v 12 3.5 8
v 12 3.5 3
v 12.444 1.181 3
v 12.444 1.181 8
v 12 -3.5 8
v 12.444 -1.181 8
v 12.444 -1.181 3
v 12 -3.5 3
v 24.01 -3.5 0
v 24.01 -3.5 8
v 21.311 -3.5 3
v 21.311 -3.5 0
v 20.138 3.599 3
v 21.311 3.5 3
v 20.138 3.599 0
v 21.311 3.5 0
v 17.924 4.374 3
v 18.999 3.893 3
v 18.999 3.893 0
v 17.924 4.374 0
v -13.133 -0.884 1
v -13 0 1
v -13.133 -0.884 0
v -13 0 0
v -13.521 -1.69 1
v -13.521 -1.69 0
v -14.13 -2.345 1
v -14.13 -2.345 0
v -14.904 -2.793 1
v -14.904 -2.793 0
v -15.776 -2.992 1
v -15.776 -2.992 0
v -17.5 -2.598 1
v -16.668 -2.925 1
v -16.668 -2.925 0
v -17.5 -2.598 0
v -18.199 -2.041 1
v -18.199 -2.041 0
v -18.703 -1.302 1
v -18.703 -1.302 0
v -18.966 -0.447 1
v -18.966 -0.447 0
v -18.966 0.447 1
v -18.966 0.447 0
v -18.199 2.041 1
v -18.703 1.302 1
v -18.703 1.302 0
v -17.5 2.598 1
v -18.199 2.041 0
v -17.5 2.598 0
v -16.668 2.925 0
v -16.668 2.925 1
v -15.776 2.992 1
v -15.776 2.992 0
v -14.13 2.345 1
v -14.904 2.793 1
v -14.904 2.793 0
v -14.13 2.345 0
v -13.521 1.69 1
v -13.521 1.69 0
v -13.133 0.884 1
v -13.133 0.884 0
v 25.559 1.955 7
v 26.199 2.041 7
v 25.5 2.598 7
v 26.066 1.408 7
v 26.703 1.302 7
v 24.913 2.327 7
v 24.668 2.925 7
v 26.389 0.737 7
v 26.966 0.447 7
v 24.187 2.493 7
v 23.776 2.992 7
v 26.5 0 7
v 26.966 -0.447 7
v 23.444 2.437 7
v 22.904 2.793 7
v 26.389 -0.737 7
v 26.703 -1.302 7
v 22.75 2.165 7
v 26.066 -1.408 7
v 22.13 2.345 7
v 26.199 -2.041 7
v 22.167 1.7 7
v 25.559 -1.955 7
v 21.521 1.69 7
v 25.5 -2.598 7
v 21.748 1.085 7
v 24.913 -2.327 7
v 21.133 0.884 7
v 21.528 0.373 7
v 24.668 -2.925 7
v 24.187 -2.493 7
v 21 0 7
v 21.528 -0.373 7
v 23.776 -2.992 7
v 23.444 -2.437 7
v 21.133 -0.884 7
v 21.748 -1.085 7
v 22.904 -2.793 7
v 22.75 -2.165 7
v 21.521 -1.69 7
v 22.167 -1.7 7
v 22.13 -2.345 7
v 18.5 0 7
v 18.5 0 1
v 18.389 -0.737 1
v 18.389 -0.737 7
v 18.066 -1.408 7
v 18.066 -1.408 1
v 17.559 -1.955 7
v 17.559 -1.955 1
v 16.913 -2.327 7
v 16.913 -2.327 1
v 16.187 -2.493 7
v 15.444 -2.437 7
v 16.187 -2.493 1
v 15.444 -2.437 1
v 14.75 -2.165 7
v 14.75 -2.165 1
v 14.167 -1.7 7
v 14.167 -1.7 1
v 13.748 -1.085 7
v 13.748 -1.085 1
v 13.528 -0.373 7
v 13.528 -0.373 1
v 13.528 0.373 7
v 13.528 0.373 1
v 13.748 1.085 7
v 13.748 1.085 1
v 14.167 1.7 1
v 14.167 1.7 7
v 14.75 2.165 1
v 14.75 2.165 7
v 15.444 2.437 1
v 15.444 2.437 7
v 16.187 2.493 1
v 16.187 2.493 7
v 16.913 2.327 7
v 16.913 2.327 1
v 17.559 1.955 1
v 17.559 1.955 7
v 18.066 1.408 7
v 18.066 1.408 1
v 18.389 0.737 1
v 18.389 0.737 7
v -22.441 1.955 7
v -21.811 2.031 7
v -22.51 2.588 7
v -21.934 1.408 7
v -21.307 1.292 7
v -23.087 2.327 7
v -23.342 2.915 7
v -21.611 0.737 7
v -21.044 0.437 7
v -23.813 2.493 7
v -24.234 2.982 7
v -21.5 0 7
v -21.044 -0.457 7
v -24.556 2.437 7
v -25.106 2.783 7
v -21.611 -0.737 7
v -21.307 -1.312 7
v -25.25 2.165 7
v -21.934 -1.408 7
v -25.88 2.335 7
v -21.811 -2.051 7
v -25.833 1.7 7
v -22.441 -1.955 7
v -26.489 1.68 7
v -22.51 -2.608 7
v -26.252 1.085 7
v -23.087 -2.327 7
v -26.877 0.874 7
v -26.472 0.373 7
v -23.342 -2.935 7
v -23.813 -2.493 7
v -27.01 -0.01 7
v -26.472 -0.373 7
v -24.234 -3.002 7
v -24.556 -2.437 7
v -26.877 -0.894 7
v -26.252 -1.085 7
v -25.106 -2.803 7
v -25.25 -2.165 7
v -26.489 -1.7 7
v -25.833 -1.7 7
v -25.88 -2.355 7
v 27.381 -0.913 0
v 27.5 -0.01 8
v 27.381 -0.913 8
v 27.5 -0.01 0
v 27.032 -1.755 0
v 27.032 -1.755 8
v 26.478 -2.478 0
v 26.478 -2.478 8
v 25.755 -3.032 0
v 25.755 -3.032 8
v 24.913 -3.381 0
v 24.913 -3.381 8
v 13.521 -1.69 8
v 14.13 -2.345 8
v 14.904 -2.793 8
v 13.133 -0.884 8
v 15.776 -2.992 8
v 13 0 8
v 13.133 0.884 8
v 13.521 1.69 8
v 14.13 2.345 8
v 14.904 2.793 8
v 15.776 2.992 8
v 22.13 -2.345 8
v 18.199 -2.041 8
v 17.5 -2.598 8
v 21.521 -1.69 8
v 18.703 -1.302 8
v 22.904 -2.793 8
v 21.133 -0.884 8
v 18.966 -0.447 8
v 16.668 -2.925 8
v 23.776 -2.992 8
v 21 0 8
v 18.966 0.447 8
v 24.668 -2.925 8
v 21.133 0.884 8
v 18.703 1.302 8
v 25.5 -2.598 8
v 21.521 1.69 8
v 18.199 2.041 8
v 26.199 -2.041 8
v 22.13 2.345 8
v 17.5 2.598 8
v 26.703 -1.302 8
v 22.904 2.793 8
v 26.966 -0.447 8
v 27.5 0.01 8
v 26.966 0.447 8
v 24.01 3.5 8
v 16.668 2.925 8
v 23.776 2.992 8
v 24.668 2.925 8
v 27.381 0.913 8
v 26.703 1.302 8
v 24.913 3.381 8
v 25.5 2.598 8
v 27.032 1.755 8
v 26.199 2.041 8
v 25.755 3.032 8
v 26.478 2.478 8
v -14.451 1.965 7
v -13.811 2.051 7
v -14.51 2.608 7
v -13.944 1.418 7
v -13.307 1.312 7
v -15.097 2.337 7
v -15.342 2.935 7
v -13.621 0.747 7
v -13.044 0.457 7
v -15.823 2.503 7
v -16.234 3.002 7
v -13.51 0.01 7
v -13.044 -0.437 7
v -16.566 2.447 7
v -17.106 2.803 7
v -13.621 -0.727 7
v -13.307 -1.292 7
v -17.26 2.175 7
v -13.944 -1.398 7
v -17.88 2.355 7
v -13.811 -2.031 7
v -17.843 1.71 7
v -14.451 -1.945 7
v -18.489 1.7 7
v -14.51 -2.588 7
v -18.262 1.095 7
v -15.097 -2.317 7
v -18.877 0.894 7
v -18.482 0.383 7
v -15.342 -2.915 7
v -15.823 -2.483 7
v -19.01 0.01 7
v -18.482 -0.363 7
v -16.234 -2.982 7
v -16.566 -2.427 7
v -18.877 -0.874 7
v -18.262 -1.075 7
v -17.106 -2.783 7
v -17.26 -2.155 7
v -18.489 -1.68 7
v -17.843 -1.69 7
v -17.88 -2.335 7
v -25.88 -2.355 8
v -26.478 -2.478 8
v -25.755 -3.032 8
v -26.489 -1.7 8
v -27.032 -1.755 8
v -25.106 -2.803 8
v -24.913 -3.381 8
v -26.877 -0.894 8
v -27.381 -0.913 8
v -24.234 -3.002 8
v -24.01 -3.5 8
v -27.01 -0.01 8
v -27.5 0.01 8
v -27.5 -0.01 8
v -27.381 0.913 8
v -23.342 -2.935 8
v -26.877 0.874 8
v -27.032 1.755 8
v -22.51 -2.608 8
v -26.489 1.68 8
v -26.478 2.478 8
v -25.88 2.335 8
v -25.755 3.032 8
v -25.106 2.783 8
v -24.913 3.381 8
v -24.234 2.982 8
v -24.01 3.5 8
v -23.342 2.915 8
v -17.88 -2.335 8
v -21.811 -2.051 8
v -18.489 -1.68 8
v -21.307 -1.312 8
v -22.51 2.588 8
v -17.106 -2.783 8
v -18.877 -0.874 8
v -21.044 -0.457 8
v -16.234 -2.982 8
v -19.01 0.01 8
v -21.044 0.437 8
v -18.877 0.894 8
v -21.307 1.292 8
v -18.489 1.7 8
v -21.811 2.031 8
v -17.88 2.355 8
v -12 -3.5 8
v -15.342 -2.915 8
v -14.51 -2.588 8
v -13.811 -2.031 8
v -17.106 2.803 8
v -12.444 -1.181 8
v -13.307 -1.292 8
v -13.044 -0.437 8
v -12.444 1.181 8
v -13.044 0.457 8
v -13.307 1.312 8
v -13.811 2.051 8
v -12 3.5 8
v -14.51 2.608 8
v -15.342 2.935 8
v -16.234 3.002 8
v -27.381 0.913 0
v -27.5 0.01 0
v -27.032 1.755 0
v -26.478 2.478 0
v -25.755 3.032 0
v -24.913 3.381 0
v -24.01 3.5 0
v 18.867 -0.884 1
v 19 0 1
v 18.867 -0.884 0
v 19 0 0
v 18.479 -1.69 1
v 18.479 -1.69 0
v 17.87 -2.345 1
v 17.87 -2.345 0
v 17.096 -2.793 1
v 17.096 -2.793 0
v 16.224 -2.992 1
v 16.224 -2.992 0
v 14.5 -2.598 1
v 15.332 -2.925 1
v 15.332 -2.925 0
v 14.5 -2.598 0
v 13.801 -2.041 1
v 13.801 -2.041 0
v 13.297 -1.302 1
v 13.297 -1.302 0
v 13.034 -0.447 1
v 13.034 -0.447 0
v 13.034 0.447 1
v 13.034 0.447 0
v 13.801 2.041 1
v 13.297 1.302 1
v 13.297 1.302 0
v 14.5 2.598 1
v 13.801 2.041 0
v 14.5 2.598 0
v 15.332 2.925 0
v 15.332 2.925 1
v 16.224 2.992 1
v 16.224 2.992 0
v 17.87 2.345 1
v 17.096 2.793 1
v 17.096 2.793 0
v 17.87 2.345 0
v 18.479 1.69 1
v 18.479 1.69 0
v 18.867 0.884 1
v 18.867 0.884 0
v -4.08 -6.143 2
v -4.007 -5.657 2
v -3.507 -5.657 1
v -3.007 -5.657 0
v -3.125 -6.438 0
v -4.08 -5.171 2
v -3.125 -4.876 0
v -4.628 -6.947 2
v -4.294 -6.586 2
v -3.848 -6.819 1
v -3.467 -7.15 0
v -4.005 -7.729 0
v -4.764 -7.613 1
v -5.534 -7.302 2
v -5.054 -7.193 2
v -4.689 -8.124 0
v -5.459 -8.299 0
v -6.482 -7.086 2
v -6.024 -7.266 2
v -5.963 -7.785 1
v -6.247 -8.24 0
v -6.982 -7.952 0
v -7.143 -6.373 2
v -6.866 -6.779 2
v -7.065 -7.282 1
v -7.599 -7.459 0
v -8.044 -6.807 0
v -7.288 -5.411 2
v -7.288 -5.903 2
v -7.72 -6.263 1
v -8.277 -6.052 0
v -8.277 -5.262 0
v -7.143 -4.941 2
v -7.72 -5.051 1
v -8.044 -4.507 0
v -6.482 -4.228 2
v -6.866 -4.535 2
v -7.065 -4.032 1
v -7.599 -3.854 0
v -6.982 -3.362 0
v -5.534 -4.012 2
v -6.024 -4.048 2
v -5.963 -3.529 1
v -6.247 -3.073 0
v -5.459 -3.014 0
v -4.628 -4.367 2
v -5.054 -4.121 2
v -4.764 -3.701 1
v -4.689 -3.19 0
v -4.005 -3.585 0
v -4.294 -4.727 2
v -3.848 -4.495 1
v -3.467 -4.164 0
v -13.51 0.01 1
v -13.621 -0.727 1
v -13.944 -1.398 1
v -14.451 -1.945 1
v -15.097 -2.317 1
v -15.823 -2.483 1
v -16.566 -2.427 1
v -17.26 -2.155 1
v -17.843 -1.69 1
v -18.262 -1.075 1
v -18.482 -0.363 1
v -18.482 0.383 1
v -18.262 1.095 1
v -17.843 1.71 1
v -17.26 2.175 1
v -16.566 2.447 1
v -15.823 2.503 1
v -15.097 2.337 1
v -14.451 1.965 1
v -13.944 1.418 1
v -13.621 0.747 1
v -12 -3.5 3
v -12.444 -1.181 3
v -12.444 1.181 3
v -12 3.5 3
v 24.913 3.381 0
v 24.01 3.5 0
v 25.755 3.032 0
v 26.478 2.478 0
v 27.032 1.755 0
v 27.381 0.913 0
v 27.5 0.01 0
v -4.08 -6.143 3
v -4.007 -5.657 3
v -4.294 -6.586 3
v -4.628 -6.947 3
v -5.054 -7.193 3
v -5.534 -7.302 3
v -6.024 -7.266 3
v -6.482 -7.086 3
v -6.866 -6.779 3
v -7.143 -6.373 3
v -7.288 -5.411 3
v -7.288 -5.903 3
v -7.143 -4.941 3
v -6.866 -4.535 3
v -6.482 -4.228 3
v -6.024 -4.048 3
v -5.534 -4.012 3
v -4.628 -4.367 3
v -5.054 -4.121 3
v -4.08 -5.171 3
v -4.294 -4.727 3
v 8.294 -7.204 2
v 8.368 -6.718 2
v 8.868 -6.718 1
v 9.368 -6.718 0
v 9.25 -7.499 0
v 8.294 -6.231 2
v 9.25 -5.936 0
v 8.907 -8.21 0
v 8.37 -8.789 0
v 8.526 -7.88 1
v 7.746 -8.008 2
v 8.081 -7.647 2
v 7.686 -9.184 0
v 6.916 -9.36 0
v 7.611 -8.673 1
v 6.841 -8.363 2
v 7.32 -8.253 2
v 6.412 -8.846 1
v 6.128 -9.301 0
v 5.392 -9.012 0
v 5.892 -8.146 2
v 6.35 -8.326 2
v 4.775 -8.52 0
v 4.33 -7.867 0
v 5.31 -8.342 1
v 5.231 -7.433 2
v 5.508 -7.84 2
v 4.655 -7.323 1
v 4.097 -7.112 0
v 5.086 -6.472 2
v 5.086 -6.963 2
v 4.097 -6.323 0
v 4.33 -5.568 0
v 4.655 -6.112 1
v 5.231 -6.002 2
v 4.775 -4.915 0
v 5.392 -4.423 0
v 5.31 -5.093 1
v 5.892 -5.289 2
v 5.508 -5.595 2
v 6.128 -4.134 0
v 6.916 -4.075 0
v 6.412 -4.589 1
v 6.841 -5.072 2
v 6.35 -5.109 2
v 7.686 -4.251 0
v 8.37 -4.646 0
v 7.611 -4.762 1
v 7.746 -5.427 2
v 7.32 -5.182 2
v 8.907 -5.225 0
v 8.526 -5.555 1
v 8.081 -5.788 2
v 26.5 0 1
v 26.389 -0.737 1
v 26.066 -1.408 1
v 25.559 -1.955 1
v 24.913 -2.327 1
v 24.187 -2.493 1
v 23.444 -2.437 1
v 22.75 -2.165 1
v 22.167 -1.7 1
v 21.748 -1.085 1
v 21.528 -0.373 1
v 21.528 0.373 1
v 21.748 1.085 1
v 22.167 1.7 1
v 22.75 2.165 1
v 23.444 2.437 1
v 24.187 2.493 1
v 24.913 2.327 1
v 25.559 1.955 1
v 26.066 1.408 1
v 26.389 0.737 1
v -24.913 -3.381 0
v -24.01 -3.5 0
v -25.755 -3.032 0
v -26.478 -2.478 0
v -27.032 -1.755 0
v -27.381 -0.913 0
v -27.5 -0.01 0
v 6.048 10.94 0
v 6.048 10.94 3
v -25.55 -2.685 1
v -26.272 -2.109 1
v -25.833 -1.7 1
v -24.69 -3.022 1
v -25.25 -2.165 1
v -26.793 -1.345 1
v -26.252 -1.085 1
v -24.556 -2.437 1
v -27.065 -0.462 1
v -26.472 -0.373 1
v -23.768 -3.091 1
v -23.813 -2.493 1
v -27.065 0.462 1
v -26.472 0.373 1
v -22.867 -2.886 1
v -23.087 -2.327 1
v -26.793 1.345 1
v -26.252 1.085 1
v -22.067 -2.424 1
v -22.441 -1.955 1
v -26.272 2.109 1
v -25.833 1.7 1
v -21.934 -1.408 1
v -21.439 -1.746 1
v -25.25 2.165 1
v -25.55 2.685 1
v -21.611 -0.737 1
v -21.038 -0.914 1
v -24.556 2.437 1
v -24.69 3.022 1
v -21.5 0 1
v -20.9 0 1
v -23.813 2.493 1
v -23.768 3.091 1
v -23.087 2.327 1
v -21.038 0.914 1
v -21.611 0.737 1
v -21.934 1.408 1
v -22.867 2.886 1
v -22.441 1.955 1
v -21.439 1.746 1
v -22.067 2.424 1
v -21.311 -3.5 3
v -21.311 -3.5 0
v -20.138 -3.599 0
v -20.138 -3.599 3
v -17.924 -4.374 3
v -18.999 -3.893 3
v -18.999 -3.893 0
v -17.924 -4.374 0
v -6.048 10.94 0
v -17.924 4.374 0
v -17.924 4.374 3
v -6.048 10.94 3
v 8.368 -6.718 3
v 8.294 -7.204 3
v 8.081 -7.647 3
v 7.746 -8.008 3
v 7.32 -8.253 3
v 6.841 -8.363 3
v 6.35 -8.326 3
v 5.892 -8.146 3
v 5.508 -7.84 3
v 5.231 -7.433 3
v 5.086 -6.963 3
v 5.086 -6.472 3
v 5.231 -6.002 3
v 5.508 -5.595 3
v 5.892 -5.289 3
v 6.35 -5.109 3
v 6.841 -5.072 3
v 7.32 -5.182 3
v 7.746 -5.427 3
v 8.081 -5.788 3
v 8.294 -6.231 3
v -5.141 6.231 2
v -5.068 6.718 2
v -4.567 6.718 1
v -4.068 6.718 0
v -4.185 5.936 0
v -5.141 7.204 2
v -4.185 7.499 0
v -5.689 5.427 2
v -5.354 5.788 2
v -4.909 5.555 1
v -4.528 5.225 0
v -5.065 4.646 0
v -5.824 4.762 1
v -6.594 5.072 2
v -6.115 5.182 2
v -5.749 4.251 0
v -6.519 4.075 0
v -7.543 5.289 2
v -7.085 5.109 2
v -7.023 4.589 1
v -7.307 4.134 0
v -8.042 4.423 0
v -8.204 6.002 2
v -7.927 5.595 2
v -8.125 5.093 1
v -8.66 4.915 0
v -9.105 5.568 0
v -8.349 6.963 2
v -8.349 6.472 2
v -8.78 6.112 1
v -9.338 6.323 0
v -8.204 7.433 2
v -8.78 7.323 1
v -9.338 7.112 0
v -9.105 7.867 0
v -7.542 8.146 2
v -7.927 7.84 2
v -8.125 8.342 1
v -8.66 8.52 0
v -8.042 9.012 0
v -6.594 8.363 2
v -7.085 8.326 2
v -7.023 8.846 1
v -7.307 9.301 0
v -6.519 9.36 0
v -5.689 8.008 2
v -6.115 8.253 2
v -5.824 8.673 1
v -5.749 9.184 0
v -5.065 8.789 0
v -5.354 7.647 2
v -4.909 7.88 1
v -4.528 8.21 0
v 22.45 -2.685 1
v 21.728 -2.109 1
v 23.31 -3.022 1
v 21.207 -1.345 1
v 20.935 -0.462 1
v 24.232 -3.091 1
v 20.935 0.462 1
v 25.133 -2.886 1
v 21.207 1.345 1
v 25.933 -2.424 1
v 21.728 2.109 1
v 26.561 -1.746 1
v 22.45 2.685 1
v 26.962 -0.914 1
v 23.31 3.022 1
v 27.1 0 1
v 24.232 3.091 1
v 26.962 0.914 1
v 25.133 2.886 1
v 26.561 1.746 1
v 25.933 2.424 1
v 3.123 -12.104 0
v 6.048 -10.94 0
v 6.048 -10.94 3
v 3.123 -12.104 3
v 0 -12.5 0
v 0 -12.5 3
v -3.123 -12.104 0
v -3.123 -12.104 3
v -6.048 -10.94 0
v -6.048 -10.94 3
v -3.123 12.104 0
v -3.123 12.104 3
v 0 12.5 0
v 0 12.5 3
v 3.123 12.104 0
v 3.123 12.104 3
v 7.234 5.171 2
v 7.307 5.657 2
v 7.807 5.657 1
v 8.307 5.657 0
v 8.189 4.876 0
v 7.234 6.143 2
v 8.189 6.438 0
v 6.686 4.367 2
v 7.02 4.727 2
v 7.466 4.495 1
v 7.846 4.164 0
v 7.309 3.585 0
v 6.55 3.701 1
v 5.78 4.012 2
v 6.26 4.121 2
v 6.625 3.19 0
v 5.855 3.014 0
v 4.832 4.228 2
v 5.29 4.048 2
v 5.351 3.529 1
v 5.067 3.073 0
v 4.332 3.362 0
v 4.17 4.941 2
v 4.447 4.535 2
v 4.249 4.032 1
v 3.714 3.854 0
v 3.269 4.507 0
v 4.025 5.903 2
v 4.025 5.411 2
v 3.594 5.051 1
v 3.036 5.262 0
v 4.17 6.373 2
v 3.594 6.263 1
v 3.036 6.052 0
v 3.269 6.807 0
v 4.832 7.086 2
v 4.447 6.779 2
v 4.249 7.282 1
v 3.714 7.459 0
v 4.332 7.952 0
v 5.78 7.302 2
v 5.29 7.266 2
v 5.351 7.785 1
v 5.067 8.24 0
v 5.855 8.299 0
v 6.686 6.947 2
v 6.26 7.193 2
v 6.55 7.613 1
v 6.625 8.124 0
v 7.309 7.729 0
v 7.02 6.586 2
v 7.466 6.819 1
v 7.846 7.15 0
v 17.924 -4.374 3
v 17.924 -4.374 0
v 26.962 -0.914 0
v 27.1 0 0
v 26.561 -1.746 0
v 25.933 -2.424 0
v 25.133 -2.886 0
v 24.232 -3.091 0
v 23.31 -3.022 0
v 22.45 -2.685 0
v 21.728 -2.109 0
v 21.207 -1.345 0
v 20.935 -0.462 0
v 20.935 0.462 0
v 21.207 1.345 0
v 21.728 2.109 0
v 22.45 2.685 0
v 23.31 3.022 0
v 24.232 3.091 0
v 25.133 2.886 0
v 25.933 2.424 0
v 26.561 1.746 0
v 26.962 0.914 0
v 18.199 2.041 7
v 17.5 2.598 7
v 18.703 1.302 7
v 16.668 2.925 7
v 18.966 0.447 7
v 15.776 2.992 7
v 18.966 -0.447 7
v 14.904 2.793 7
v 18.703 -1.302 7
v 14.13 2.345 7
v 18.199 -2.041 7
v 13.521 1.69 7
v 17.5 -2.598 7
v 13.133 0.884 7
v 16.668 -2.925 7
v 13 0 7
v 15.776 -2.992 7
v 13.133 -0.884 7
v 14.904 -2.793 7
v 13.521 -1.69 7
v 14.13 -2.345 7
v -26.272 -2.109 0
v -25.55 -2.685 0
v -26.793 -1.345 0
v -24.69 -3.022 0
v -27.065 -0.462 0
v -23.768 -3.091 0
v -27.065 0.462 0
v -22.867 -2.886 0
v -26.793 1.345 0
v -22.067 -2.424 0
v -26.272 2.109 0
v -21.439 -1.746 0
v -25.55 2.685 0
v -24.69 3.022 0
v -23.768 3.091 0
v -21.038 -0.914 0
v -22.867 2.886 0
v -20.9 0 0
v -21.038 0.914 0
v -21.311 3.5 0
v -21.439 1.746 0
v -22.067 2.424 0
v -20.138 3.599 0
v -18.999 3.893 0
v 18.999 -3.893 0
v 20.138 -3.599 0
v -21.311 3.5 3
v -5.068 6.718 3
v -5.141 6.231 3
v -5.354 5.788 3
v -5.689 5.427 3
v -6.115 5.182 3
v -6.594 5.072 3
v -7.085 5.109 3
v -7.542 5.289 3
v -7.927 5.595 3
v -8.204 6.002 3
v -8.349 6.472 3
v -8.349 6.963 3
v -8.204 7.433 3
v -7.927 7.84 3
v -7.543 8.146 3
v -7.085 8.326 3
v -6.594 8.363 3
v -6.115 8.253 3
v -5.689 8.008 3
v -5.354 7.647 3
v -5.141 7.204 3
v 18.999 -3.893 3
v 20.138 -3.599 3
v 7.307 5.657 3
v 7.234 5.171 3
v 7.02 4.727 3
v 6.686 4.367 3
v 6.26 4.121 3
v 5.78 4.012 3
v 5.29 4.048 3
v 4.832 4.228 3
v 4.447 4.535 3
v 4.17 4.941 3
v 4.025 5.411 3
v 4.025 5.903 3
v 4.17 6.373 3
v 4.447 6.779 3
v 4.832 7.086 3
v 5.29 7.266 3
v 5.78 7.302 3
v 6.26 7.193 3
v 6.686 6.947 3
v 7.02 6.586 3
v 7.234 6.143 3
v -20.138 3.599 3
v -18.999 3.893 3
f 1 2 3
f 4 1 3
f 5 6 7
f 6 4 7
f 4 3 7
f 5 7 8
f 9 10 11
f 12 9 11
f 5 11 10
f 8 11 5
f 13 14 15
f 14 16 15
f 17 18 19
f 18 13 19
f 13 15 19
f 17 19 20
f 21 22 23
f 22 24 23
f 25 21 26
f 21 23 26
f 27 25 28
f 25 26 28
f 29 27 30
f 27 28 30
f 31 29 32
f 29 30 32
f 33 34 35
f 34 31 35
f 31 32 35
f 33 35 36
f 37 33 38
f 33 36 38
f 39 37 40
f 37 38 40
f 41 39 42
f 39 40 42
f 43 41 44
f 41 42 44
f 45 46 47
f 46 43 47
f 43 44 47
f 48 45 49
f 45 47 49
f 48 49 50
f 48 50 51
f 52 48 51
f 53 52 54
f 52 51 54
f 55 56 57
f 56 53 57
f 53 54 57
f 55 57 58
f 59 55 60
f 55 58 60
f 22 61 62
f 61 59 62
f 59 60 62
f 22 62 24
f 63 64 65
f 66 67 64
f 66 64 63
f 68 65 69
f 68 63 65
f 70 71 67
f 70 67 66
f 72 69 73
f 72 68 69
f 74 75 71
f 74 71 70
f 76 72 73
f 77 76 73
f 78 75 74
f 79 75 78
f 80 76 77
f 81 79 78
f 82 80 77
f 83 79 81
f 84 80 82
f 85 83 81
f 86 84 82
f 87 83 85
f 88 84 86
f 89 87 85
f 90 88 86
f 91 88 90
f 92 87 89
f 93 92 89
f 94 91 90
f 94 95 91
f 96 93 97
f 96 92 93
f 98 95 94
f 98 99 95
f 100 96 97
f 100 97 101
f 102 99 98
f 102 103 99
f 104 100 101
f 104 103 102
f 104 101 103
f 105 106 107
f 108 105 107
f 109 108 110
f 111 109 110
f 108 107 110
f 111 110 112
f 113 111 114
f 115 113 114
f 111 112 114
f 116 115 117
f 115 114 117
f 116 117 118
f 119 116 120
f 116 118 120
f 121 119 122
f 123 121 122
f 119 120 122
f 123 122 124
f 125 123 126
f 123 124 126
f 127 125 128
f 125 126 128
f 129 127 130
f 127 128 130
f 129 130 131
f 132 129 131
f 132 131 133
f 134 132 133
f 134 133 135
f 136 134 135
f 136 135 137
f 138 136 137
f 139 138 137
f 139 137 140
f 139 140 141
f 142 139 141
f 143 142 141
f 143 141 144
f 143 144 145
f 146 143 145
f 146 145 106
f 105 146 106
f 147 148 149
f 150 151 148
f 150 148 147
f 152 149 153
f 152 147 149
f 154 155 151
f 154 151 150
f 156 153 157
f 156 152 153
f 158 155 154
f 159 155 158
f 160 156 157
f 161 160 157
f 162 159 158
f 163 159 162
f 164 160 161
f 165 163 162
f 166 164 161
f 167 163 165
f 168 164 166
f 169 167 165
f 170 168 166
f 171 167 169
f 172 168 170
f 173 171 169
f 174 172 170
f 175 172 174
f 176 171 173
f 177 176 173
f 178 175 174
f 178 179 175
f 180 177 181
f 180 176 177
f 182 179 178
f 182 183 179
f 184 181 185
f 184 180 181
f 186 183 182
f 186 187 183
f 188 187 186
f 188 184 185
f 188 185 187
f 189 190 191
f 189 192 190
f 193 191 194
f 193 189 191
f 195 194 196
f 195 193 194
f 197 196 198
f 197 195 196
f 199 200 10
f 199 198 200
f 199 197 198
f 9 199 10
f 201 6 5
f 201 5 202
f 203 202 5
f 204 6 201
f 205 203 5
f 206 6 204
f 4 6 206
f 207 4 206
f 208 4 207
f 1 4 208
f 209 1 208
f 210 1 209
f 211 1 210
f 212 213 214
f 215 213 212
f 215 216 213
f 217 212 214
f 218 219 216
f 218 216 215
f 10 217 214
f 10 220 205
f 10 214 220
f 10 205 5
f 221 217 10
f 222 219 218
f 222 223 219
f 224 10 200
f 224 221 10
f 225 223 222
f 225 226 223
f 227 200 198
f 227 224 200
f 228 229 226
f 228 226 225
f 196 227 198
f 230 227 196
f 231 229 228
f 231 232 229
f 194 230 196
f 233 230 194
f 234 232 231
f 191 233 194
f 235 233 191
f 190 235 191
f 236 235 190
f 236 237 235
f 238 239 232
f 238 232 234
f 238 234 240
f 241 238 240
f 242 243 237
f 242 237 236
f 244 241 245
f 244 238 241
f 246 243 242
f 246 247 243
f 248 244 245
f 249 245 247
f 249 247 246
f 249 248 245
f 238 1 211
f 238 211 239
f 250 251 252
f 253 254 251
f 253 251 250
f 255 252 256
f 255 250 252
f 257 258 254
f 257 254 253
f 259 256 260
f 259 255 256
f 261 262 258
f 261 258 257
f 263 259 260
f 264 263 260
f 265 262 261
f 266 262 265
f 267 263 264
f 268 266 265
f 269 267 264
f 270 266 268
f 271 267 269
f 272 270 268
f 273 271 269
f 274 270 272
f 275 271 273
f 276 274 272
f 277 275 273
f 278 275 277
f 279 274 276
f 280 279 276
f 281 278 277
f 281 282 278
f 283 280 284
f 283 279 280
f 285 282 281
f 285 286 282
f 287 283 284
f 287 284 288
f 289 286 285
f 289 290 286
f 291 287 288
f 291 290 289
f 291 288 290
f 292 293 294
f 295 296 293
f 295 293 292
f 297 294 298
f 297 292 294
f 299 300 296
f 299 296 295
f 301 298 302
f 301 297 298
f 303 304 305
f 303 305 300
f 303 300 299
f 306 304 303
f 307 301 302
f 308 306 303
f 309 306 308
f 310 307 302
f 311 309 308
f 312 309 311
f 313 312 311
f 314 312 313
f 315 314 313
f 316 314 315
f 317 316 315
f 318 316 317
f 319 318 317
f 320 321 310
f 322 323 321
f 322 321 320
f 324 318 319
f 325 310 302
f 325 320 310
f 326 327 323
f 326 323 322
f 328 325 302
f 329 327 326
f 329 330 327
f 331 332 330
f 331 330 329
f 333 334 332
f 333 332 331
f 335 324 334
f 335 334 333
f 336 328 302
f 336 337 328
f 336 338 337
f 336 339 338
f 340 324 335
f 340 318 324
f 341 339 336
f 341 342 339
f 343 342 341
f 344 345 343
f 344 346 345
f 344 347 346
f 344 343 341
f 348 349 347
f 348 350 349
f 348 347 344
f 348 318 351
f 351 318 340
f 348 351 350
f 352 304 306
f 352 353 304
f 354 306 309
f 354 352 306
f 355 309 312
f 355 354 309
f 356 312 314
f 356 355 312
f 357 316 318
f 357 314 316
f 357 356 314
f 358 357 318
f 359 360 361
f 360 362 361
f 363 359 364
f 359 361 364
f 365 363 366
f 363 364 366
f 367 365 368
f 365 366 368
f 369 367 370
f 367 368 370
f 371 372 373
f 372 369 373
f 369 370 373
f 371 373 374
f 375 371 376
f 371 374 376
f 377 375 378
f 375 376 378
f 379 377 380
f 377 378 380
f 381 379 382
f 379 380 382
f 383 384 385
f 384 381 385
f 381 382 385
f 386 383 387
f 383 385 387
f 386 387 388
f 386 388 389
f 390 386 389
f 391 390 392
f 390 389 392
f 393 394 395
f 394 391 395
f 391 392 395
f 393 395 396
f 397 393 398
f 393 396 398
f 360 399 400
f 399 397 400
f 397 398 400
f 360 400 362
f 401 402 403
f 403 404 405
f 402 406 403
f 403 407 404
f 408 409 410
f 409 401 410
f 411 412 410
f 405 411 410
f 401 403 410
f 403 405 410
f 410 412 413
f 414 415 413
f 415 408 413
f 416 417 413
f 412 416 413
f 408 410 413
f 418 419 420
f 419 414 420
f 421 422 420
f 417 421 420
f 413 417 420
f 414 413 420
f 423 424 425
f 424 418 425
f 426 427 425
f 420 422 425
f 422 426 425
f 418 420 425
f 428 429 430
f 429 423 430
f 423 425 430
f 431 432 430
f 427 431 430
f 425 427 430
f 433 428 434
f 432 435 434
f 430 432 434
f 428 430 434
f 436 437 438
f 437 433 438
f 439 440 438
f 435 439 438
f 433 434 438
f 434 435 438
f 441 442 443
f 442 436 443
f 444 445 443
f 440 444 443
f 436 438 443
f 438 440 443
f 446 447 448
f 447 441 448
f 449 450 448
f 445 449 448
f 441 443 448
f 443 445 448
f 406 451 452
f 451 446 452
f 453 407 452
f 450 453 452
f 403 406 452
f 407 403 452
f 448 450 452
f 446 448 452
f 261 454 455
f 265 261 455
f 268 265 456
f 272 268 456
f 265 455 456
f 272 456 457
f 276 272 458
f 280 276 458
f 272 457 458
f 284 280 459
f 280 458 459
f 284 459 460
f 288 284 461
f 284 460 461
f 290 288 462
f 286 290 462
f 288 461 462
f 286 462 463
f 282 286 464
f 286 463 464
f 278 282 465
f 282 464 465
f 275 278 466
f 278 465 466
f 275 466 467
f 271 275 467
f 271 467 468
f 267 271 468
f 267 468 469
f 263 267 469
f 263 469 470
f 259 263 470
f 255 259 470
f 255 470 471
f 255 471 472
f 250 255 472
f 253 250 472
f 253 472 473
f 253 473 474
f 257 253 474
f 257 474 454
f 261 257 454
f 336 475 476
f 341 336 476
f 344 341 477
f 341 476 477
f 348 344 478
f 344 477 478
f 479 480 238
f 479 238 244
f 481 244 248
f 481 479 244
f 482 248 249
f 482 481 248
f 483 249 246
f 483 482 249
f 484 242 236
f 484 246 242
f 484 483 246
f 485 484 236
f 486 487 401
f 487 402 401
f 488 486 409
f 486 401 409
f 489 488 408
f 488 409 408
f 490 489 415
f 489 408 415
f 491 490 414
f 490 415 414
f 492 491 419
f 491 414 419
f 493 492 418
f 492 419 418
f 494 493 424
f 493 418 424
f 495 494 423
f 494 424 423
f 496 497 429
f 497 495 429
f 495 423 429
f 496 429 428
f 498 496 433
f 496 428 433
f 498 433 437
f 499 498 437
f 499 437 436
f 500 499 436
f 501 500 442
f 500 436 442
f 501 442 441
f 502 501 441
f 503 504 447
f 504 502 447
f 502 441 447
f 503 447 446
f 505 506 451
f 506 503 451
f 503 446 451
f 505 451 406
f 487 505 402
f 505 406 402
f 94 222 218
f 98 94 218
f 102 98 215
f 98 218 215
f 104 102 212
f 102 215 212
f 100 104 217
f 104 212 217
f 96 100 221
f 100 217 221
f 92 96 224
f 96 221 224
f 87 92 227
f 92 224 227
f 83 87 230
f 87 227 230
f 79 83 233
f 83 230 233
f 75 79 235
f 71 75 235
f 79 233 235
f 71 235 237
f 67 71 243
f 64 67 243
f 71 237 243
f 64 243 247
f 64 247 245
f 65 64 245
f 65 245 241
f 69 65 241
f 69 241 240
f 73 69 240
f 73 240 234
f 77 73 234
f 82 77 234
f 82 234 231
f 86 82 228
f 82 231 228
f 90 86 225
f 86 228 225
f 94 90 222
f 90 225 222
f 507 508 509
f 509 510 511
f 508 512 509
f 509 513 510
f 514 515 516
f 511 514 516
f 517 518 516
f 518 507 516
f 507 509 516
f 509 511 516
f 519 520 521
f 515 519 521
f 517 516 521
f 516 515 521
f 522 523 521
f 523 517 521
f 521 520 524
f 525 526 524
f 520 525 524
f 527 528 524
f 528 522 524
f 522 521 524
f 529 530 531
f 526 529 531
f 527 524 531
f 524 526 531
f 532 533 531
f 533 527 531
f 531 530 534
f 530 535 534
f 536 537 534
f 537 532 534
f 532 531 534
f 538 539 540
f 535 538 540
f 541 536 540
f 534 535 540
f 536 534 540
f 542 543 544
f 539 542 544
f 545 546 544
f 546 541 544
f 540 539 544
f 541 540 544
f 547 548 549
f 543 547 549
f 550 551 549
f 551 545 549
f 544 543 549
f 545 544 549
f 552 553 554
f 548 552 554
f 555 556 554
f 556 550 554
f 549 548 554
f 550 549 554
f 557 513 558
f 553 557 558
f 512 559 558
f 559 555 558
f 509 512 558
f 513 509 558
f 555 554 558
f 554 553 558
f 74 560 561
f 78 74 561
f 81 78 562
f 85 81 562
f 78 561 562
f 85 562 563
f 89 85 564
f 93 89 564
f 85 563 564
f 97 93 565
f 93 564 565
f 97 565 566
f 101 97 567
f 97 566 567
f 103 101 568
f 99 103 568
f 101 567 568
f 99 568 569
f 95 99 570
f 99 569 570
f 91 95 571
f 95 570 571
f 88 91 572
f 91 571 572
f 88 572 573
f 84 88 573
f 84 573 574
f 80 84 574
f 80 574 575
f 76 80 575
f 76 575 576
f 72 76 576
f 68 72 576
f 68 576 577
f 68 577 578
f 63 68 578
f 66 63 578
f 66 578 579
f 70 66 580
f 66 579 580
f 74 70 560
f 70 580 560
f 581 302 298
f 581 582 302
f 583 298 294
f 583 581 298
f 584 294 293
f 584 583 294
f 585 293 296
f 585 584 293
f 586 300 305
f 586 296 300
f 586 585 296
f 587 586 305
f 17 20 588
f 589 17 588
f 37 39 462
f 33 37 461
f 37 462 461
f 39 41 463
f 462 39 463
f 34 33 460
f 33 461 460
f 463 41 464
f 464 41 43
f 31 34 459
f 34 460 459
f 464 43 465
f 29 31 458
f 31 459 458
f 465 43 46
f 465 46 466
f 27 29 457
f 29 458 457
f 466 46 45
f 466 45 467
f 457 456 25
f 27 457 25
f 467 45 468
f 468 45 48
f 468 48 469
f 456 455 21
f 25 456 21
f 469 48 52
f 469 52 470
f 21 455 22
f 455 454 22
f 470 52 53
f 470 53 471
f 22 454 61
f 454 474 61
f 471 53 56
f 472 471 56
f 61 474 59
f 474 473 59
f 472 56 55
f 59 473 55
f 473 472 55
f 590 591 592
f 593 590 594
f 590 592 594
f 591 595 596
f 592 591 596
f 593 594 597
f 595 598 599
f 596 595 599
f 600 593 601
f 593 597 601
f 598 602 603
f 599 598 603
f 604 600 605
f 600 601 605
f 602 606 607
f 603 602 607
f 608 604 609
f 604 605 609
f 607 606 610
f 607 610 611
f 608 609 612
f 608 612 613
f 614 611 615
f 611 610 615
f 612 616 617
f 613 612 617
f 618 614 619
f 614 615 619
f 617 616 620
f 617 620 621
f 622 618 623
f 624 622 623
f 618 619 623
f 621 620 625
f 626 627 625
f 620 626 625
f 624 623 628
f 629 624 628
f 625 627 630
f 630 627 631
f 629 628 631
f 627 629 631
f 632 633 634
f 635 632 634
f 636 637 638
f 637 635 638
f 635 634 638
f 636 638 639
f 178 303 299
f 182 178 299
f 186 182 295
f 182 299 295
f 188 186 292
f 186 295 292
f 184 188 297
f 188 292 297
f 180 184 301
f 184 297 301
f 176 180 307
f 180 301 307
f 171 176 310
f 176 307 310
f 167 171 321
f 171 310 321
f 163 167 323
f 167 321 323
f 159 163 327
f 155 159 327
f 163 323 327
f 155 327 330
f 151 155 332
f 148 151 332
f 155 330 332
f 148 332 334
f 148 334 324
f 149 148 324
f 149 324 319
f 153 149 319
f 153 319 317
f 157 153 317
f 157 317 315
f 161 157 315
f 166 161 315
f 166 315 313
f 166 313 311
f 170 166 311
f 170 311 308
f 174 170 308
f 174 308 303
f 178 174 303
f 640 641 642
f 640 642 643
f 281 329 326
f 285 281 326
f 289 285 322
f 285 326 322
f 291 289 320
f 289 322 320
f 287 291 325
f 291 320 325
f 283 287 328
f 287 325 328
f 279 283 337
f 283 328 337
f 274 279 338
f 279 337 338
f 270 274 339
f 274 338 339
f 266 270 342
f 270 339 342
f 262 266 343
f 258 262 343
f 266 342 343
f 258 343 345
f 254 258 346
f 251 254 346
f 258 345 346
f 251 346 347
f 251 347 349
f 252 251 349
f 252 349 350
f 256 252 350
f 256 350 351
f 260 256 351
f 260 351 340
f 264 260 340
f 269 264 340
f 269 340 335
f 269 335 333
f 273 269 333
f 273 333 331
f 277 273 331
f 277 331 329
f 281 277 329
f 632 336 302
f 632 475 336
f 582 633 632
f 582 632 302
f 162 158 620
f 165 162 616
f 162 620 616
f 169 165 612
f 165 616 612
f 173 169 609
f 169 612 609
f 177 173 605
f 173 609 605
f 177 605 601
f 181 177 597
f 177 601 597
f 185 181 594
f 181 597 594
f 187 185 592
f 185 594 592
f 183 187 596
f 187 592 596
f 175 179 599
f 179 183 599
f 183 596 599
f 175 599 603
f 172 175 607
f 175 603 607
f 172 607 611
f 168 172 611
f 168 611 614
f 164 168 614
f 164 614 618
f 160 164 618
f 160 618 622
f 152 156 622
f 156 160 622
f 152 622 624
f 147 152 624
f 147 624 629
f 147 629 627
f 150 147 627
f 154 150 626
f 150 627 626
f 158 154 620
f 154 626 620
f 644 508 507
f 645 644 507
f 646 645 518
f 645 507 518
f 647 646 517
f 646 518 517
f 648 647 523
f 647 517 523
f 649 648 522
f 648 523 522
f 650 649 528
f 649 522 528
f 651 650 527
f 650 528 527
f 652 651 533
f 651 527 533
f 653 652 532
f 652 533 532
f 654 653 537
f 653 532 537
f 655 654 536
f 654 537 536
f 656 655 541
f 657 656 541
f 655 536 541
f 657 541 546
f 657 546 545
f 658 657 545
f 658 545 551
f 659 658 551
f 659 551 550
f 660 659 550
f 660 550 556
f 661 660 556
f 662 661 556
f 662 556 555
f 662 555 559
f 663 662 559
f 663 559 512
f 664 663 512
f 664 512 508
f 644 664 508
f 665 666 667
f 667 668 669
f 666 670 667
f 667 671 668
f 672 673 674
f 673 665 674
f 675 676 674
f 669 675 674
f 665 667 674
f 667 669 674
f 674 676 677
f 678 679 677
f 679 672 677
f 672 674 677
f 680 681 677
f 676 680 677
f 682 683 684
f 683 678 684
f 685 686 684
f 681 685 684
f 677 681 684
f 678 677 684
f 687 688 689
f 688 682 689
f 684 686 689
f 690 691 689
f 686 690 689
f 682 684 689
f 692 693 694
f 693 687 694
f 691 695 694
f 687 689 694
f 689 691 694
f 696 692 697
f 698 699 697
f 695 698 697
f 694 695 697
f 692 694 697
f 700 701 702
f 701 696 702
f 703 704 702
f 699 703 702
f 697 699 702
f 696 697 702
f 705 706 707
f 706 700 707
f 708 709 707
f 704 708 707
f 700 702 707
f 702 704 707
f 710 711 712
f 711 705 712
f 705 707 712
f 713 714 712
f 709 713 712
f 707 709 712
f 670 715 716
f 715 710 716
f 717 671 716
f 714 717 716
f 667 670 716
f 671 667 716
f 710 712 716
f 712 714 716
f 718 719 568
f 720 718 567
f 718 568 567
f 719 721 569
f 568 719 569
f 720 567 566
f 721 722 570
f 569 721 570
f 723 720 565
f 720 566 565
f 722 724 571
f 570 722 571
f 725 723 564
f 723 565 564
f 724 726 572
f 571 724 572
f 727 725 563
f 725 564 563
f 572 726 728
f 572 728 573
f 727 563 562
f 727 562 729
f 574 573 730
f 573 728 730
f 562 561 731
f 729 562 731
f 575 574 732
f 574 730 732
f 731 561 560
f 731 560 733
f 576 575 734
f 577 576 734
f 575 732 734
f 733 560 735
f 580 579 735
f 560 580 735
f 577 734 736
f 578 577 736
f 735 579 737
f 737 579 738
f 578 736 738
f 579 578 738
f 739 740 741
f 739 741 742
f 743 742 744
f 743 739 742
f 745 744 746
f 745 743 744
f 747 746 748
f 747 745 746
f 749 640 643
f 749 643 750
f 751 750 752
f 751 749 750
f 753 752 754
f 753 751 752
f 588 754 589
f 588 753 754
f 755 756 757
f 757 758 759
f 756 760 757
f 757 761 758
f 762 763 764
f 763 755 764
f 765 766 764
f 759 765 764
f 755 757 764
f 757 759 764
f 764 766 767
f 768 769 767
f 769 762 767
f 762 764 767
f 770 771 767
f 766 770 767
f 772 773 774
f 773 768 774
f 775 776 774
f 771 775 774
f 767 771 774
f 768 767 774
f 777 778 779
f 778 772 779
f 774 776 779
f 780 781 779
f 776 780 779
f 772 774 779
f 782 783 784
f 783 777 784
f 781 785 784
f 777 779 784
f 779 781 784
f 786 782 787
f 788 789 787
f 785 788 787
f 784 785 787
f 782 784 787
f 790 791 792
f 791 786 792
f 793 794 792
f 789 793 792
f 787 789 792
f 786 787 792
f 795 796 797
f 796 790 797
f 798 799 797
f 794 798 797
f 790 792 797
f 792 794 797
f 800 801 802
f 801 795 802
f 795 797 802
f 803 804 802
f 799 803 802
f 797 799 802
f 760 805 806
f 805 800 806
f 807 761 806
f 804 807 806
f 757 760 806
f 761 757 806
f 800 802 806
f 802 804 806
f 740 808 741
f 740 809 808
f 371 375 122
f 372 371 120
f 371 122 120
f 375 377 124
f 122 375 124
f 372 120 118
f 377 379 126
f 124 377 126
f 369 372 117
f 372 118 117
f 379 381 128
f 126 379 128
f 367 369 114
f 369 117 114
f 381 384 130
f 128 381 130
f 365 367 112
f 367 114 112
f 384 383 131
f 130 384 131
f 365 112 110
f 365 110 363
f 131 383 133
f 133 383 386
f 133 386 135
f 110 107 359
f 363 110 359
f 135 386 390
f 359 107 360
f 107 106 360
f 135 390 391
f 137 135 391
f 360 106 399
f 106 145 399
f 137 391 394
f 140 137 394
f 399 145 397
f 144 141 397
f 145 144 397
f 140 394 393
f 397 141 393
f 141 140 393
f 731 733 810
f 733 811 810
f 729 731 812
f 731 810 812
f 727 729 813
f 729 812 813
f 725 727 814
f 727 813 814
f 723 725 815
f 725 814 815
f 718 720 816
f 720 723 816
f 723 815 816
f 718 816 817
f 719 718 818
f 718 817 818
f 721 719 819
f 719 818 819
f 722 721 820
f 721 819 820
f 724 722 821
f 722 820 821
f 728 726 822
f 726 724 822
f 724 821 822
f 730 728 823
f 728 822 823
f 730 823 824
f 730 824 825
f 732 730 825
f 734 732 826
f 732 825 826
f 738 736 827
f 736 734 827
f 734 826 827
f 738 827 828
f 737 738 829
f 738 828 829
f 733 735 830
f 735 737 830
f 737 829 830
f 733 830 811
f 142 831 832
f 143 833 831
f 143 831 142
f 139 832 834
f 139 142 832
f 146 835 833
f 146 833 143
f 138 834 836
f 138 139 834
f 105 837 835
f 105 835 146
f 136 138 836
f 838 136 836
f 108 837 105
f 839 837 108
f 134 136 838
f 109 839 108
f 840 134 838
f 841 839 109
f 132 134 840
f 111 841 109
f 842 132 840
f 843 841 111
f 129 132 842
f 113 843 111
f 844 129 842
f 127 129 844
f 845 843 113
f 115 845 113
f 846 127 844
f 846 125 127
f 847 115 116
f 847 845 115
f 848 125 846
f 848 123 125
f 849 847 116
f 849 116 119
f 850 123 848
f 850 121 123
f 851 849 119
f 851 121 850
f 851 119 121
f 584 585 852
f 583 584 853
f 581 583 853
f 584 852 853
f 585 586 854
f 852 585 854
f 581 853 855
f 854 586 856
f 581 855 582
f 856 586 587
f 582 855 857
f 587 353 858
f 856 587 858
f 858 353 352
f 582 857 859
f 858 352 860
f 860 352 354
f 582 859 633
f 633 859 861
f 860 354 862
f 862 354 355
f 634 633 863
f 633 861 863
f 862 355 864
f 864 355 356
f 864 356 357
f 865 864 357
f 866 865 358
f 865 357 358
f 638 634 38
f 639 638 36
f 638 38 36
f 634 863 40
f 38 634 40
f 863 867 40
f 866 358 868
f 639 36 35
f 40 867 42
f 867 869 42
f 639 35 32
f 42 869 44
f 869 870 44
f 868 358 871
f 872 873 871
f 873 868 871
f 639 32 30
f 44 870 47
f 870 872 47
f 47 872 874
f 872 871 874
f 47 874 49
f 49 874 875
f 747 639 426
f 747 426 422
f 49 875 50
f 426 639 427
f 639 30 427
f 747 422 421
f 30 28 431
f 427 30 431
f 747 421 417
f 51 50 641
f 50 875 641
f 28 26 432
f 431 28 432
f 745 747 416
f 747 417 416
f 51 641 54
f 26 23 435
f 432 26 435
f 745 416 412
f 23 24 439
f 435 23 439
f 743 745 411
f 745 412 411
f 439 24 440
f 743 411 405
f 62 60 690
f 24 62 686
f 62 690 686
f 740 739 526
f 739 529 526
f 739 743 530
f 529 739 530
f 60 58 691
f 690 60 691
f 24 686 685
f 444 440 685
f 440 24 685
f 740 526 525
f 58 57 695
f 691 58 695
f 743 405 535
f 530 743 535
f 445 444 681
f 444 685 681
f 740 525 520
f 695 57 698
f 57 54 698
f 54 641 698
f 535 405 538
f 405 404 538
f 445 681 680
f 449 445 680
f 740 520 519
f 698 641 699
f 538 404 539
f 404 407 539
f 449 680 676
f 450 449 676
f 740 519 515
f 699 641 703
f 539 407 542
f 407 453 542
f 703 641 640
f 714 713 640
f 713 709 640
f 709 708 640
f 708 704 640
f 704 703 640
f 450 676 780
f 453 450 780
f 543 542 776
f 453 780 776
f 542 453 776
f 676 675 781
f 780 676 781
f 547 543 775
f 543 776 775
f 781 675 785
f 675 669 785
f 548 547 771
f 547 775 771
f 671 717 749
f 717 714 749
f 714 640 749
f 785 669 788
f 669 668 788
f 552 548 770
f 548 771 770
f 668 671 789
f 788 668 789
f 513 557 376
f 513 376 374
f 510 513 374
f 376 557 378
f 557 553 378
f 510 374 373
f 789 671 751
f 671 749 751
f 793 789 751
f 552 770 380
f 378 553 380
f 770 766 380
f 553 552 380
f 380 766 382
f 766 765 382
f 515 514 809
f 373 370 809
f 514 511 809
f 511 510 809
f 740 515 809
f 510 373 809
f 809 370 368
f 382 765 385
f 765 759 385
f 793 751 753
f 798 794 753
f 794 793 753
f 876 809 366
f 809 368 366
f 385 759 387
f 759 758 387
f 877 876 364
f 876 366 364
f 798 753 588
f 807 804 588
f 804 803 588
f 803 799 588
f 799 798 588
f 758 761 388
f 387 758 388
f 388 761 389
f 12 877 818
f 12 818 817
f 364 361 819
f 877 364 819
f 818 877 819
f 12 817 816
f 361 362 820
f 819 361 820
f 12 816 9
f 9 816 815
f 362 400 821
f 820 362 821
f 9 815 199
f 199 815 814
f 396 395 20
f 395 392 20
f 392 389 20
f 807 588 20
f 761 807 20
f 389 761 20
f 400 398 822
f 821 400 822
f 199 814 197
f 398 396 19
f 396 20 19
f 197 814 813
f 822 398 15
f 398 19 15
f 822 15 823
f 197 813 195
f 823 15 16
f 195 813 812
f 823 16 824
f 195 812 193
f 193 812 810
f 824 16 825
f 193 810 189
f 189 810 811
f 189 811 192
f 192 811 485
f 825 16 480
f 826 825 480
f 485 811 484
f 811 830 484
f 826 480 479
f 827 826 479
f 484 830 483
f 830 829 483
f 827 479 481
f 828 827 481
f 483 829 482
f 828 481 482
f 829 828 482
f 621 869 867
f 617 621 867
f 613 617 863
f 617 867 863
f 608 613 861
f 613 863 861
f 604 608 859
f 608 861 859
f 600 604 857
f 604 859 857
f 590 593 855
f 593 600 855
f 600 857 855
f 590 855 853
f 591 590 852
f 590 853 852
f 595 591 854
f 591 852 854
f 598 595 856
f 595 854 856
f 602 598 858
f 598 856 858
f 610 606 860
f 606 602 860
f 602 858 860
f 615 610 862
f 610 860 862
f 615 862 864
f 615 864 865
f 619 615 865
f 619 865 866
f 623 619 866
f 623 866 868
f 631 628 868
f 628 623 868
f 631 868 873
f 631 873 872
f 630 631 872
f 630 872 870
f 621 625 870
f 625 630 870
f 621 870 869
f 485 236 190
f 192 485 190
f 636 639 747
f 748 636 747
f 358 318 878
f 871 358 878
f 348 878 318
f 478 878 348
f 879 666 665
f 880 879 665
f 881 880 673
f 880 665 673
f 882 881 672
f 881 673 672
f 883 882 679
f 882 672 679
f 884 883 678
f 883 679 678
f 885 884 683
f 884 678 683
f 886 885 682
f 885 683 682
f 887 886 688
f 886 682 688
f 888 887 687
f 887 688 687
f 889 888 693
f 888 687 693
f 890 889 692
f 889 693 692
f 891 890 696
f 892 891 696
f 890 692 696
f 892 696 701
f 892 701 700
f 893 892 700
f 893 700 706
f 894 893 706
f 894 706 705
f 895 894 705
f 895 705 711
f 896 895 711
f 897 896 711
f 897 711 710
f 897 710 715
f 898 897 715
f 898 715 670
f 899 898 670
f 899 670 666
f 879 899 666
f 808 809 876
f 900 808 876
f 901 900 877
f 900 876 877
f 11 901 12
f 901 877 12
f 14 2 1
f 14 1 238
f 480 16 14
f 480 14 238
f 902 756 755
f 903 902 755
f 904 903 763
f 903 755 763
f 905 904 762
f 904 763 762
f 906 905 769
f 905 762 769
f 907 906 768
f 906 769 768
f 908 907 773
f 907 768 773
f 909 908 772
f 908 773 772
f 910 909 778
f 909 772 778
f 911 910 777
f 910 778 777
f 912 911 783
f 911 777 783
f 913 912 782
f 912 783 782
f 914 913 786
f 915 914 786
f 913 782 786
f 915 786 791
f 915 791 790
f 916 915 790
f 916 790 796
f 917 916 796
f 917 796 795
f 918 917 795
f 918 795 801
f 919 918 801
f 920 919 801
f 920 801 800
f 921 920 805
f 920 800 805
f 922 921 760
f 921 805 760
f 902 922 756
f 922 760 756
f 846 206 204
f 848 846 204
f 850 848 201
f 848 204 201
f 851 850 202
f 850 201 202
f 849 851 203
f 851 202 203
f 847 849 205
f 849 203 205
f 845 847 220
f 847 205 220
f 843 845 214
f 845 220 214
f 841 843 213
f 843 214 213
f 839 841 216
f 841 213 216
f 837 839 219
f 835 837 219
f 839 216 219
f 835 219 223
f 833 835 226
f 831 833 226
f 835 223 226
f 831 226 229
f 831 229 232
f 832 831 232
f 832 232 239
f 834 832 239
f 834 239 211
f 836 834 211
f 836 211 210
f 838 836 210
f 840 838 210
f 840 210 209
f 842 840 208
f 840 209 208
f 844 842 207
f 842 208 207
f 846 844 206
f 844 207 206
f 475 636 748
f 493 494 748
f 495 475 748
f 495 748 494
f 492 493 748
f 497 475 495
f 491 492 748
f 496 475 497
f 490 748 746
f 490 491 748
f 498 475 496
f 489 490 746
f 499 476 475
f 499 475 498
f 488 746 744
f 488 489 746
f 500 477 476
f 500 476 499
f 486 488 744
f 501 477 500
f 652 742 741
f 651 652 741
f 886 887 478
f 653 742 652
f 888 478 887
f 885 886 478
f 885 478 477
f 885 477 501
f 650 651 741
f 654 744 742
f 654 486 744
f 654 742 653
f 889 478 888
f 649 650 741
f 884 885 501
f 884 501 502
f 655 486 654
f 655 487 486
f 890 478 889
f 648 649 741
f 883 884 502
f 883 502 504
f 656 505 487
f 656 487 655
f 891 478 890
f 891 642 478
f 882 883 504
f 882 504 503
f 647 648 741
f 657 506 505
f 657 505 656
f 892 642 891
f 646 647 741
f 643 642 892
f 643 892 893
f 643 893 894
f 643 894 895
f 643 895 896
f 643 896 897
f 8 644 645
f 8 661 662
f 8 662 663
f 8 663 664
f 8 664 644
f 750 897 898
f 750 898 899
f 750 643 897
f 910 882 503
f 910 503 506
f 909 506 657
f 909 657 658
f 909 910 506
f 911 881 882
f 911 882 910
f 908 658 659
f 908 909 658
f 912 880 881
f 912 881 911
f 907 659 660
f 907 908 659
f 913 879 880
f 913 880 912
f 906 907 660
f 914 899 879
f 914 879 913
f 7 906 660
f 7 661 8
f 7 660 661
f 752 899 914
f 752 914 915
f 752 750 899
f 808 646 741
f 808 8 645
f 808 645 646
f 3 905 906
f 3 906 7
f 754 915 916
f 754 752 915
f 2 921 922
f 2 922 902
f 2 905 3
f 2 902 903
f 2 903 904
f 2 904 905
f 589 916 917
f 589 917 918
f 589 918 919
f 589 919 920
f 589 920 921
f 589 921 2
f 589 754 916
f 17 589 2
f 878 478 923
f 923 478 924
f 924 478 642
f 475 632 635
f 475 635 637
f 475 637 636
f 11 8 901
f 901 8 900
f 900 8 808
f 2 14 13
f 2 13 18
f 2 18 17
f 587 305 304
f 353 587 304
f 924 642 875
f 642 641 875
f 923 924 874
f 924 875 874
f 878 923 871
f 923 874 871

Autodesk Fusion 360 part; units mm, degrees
sketch "Sketch2" plane through (0, 0, 0) normal (0, 0, 1) x (1, 0, 0)
  line L0 (-21.3111, -3.5) -> (-24.01, -3.5)
  line L1 (-27.5, -0.01) -> (-27.5, 0.01)
  line L2 (-24.01, 3.5) -> (-21.3111, 3.5)
  line L3 (27.5, 0.01) -> (27.5, -0.01)
  arc A0 (-27.5, -0.01) -> (-24.01, -3.5) centre (-24.01, -0.01) ccw
  arc A1 (-24.01, 3.5) -> (-27.5, 0.01) centre (-24.01, 0.01) ccw
  arc A2 (27.5, 0.01) -> (24.01, 3.5) centre (24.01, 0.01) ccw
  arc A3 (24.01, -3.5) -> (27.5, -0.01) centre (24.01, -0.01) ccw
  circle A4 centre (24, 0) radius 2.5
  circle A5 centre (-24, 0) radius 2.5
  circle A6 centre (6.7175, 6.7175) radius 1.65
  circle A7 centre (-5.6569, 5.6569) radius 1.65
  circle A8 centre (-6.7175, -6.7175) radius 1.65
  circle A9 centre (5.6569, -5.6569) radius 1.65
  circle A10 centre (0, 0) radius 12.5
  line L4 (-17.9244, 4.3738) -> (-6.0478, 10.9396)
  line L5 (-17.9244, -4.3738) -> (-6.0478, -10.9396)
  line L6 (17.9244, 4.3738) -> (6.0478, 10.9396)
  line L7 (17.9244, -4.3738) -> (6.0478, -10.9396)
  arc A11 (-21.3111, 3.5) -> (-17.9244, 4.3738) centre (-21.3111, 10.5) ccw
  arc A12 (-17.9244, -4.3738) -> (-21.3111, -3.5) centre (-21.3111, -10.5) ccw
  line L8 (24.01, 3.5) -> (21.3111, 3.5)
  line L9 (24.01, -3.5) -> (21.3111, -3.5)
  arc A13 (21.3111, -3.5) -> (17.9244, -4.3738) centre (21.3111, -10.5) ccw
  arc A14 (17.9244, 4.3738) -> (21.3111, 3.5) centre (21.3111, 10.5) ccw
  line L10 (21.3111, -3.5) -> (12, -3.5)
  line L11 (-12, -3.5) -> (-21.3111, -3.5)
  line L12 (-21.3111, 3.5) -> (-12, 3.5)
  line L13 (12, 3.5) -> (21.3111, 3.5)
  line L14 (-16.3799, 2.0847) -> (-27.5, 3.5) construction
  line L15 (-27.5, -3.5) -> (-16.3799, -2.0847) construction
  line L16 (-12.4, -1.5782) -> (12.4, 1.5782) construction
  line L17 (25.3613, 3.2278) -> (27.5, 3.5) construction
  line L18 (27.5, -3.5) -> (25.3613, -3.2278) construction
  line L19 (12.4, -1.5782) -> (-12.4, 1.5782) construction
  circle A15 centre (-16.01, 0.01) radius 2.5
  circle A16 centre (16, 0) radius 2.5
  dimension "d42" = 9.5
  dimension "d44" = 8
  dimension "d45" = 8
  dimension "d46" = 9.5
  dimension "d47" = 55
  dimension "d48" = 7
  dimension "d49" = 3.49
  dimension "d50" = 3.49
  dimension "d51" = 3.49
  dimension "d52" = 3.49
  dimension "d53" = 24
  dimension "d54" = 5
  dimension "d55" = 24
  dimension "d56" = 5
  dimension "d61" = 3.3
  dimension "d62" = 3.3
  dimension "d63" = 3.3
  dimension "d64" = 3.3
  dimension "d65" = 25
  dimension "d66" = 7
  dimension "d67" = 7
  dimension "d68" = 7
  dimension "d69" = 7
  dimension "d92" = 8
  dimension "d93" = 8
  dimension "d94" = 5
  dimension "d95" = 5
extrude "Extrude1" add sketch "Sketch2" along normal blind 8 contours L0 L1 L2 A0 A1 A10 L11 L12 | A15 makes body 1
extrude "Extrude2" add sketch "Sketch2" along normal blind 8 separate body contours L3 A2 A3 A10 L8 L9 L10 L13 | A16 makes body 2
extrude "Extrude3" add sketch "Sketch2" along normal blind 3 separate body contours A10 L5 A12 L11 | A10 | A10 L4 A11 L12 | A10 L7 A13 L10 | A10 L6 A14 L13 makes body 3
sketch "Sketch3" plane through (0, 0, 0) normal (0, 0, 1) x (1, 0, 0)
  circle A0 centre (-15, 0) radius 3.1
  circle A1 centre (-24, 0) radius 3.1
  circle A2 centre (15, 0) radius 3.1
  circle A3 centre (24, 0) radius 3.1
  dimension "d76" = 6.2
  dimension "d77" = 6.2
  dimension "d78" = 6.2
  dimension "d79" = 6.2
extrude "Extrude4" cut sketch "Sketch3" along normal blind 1 contours A1 bodies 1
extrude "Extrude7" cut sketch "Sketch3" along normal blind 1 contours A3 bodies 2
chamfer "Chamfer1" distance 2 distance2 1 1 edges at (4.1185, -5.0602, 0) measured on face at (7.3048, -5.7391, 2) on bodies 3
chamfer "Chamfer2" distance 2 distance2 1 3 edges at (-8.2559, -6.1208, 0) (-7.1952, 6.2535, 0) (5.1792, 7.3142, 0) measured on face at (-5.0696, -6.7998, 2) measured on face at (-4.0089, 5.5746, 2) measured on face at (8.3655, 6.6353, 2) on bodies 3
extrude "Extrude8" cut sketch "Sketch2" along normal blind 10 contours A15 bodies 1
extrude "Extrude9" cut sketch "Sketch2" along normal blind 10 contours A16 bodies 2
sketch "Sketch4" plane through (0, 0, 0) normal (0, 0, 1) x (1, 0, 0)
  circle A0 centre (-16, 0) radius 3
  circle A1 centre (16, 0) radius 3
  dimension "d100" = 6
  dimension "d101" = 6
extrude "Extrude10" cut sketch "Sketch4" along normal blind 1 contours A0 bodies 1
extrude "Extrude11" cut sketch "Sketch4" along normal blind 1 contours A1 bodies 2
sketch "Sketch5" plane through (0, 0, 0) normal (0, 0, 1) x (1, 0, 0)
  line L0 (0, 0) -> (5.6569, 5.6569)
  line L1 (0, 0) -> (8, 0) construction
  line L2 (0, 0) -> (-5.6569, -5.6569)
  line L3 (0, 0) -> (6.7175, -6.7175)
  line L4 (0, 0) -> (-6.7175, 6.7175)
  circle A0 centre (-6.7175, 6.7175) radius 1.65
  circle A1 centre (6.7175, -6.7175) radius 1.65
  circle A2 centre (-5.6569, -5.6569) radius 1.65
  circle A3 centre (5.6569, 5.6569) radius 1.65
  dimension "d106" = 8
  dimension "d107" = 45
  dimension "d108" = 8
  dimension "d109" = 9.5
  dimension "d110" = 9.5
  dimension "d111" = 3.3
  dimension "d112" = 3.3
  dimension "d113" = 3.3
  dimension "d114" = 3.3
extrude "Extrude12" add sketch "Sketch2" along normal blind 3 contours A10 | A6 | A7 | A8 | A9 bodies 3 2 1
extrude "Extrude13" cut sketch "Sketch5" along normal blind 10 contours A2 bodies 3
extrude "Extrude14" cut sketch "Sketch5" along normal blind 10 contours A0 | A1 | A3 bodies 3
chamfer "Chamfer3" distance 1 distance2 2 4 edges at (-7.1952, -6.2535, 0) (5.1792, -7.3142, 0) (-8.2559, 6.1208, 0) (4.1185, 5.0602, 0) measured on face at (1.9475, -1.9853, 0) measured on face at (1.9475, -1.9853, 0) measured on face at (1.9475, -1.9853, 0) measured on face at (1.9475, -1.9853, 0) on bodies 3
sketch "Sketch6" plane through (0, 0, 8) normal (0, 0, 1) x (-1, 0, 0)
  circle A0 centre (16.01, -0.01) radius 2.5
  circle A1 centre (24, 0) radius 2.5
  arc A2 (24.01, -3.5) -> (27.5, -0.01) centre (24.01, -0.01) ccw
  line L0 (27.5, -0.01) -> (27.5, 0.01)
  arc A3 (27.5, 0.01) -> (24.01, 3.5) centre (24.01, 0.01) ccw
  line L1 (24.01, 3.5) -> (12, 3.5)
  arc A4 (12, -3.5) -> (12, 3.5) centre (0, 0) ccw
  line L2 (12, -3.5) -> (24.01, -3.5)
  circle A5 centre (-16, 0) radius 3
  circle A6 centre (-24, 0) radius 3
  circle A7 centre (16.01, -0.01) radius 3
  circle A8 centre (24.01, 0.01) radius 3
  dimension "d123" = 6
  dimension "d124" = 6
  dimension "d125" = 6
  dimension "d126" = 6
extrude "Extrude15" cut sketch "Sketch6" against normal blind 1 contours A6 bodies 3
extrude "Extrude16" cut sketch "Sketch6" against normal blind 1 contours A0 | A5 | A7 | A8 bodies 3
combine "Combine1" [suppressed]
